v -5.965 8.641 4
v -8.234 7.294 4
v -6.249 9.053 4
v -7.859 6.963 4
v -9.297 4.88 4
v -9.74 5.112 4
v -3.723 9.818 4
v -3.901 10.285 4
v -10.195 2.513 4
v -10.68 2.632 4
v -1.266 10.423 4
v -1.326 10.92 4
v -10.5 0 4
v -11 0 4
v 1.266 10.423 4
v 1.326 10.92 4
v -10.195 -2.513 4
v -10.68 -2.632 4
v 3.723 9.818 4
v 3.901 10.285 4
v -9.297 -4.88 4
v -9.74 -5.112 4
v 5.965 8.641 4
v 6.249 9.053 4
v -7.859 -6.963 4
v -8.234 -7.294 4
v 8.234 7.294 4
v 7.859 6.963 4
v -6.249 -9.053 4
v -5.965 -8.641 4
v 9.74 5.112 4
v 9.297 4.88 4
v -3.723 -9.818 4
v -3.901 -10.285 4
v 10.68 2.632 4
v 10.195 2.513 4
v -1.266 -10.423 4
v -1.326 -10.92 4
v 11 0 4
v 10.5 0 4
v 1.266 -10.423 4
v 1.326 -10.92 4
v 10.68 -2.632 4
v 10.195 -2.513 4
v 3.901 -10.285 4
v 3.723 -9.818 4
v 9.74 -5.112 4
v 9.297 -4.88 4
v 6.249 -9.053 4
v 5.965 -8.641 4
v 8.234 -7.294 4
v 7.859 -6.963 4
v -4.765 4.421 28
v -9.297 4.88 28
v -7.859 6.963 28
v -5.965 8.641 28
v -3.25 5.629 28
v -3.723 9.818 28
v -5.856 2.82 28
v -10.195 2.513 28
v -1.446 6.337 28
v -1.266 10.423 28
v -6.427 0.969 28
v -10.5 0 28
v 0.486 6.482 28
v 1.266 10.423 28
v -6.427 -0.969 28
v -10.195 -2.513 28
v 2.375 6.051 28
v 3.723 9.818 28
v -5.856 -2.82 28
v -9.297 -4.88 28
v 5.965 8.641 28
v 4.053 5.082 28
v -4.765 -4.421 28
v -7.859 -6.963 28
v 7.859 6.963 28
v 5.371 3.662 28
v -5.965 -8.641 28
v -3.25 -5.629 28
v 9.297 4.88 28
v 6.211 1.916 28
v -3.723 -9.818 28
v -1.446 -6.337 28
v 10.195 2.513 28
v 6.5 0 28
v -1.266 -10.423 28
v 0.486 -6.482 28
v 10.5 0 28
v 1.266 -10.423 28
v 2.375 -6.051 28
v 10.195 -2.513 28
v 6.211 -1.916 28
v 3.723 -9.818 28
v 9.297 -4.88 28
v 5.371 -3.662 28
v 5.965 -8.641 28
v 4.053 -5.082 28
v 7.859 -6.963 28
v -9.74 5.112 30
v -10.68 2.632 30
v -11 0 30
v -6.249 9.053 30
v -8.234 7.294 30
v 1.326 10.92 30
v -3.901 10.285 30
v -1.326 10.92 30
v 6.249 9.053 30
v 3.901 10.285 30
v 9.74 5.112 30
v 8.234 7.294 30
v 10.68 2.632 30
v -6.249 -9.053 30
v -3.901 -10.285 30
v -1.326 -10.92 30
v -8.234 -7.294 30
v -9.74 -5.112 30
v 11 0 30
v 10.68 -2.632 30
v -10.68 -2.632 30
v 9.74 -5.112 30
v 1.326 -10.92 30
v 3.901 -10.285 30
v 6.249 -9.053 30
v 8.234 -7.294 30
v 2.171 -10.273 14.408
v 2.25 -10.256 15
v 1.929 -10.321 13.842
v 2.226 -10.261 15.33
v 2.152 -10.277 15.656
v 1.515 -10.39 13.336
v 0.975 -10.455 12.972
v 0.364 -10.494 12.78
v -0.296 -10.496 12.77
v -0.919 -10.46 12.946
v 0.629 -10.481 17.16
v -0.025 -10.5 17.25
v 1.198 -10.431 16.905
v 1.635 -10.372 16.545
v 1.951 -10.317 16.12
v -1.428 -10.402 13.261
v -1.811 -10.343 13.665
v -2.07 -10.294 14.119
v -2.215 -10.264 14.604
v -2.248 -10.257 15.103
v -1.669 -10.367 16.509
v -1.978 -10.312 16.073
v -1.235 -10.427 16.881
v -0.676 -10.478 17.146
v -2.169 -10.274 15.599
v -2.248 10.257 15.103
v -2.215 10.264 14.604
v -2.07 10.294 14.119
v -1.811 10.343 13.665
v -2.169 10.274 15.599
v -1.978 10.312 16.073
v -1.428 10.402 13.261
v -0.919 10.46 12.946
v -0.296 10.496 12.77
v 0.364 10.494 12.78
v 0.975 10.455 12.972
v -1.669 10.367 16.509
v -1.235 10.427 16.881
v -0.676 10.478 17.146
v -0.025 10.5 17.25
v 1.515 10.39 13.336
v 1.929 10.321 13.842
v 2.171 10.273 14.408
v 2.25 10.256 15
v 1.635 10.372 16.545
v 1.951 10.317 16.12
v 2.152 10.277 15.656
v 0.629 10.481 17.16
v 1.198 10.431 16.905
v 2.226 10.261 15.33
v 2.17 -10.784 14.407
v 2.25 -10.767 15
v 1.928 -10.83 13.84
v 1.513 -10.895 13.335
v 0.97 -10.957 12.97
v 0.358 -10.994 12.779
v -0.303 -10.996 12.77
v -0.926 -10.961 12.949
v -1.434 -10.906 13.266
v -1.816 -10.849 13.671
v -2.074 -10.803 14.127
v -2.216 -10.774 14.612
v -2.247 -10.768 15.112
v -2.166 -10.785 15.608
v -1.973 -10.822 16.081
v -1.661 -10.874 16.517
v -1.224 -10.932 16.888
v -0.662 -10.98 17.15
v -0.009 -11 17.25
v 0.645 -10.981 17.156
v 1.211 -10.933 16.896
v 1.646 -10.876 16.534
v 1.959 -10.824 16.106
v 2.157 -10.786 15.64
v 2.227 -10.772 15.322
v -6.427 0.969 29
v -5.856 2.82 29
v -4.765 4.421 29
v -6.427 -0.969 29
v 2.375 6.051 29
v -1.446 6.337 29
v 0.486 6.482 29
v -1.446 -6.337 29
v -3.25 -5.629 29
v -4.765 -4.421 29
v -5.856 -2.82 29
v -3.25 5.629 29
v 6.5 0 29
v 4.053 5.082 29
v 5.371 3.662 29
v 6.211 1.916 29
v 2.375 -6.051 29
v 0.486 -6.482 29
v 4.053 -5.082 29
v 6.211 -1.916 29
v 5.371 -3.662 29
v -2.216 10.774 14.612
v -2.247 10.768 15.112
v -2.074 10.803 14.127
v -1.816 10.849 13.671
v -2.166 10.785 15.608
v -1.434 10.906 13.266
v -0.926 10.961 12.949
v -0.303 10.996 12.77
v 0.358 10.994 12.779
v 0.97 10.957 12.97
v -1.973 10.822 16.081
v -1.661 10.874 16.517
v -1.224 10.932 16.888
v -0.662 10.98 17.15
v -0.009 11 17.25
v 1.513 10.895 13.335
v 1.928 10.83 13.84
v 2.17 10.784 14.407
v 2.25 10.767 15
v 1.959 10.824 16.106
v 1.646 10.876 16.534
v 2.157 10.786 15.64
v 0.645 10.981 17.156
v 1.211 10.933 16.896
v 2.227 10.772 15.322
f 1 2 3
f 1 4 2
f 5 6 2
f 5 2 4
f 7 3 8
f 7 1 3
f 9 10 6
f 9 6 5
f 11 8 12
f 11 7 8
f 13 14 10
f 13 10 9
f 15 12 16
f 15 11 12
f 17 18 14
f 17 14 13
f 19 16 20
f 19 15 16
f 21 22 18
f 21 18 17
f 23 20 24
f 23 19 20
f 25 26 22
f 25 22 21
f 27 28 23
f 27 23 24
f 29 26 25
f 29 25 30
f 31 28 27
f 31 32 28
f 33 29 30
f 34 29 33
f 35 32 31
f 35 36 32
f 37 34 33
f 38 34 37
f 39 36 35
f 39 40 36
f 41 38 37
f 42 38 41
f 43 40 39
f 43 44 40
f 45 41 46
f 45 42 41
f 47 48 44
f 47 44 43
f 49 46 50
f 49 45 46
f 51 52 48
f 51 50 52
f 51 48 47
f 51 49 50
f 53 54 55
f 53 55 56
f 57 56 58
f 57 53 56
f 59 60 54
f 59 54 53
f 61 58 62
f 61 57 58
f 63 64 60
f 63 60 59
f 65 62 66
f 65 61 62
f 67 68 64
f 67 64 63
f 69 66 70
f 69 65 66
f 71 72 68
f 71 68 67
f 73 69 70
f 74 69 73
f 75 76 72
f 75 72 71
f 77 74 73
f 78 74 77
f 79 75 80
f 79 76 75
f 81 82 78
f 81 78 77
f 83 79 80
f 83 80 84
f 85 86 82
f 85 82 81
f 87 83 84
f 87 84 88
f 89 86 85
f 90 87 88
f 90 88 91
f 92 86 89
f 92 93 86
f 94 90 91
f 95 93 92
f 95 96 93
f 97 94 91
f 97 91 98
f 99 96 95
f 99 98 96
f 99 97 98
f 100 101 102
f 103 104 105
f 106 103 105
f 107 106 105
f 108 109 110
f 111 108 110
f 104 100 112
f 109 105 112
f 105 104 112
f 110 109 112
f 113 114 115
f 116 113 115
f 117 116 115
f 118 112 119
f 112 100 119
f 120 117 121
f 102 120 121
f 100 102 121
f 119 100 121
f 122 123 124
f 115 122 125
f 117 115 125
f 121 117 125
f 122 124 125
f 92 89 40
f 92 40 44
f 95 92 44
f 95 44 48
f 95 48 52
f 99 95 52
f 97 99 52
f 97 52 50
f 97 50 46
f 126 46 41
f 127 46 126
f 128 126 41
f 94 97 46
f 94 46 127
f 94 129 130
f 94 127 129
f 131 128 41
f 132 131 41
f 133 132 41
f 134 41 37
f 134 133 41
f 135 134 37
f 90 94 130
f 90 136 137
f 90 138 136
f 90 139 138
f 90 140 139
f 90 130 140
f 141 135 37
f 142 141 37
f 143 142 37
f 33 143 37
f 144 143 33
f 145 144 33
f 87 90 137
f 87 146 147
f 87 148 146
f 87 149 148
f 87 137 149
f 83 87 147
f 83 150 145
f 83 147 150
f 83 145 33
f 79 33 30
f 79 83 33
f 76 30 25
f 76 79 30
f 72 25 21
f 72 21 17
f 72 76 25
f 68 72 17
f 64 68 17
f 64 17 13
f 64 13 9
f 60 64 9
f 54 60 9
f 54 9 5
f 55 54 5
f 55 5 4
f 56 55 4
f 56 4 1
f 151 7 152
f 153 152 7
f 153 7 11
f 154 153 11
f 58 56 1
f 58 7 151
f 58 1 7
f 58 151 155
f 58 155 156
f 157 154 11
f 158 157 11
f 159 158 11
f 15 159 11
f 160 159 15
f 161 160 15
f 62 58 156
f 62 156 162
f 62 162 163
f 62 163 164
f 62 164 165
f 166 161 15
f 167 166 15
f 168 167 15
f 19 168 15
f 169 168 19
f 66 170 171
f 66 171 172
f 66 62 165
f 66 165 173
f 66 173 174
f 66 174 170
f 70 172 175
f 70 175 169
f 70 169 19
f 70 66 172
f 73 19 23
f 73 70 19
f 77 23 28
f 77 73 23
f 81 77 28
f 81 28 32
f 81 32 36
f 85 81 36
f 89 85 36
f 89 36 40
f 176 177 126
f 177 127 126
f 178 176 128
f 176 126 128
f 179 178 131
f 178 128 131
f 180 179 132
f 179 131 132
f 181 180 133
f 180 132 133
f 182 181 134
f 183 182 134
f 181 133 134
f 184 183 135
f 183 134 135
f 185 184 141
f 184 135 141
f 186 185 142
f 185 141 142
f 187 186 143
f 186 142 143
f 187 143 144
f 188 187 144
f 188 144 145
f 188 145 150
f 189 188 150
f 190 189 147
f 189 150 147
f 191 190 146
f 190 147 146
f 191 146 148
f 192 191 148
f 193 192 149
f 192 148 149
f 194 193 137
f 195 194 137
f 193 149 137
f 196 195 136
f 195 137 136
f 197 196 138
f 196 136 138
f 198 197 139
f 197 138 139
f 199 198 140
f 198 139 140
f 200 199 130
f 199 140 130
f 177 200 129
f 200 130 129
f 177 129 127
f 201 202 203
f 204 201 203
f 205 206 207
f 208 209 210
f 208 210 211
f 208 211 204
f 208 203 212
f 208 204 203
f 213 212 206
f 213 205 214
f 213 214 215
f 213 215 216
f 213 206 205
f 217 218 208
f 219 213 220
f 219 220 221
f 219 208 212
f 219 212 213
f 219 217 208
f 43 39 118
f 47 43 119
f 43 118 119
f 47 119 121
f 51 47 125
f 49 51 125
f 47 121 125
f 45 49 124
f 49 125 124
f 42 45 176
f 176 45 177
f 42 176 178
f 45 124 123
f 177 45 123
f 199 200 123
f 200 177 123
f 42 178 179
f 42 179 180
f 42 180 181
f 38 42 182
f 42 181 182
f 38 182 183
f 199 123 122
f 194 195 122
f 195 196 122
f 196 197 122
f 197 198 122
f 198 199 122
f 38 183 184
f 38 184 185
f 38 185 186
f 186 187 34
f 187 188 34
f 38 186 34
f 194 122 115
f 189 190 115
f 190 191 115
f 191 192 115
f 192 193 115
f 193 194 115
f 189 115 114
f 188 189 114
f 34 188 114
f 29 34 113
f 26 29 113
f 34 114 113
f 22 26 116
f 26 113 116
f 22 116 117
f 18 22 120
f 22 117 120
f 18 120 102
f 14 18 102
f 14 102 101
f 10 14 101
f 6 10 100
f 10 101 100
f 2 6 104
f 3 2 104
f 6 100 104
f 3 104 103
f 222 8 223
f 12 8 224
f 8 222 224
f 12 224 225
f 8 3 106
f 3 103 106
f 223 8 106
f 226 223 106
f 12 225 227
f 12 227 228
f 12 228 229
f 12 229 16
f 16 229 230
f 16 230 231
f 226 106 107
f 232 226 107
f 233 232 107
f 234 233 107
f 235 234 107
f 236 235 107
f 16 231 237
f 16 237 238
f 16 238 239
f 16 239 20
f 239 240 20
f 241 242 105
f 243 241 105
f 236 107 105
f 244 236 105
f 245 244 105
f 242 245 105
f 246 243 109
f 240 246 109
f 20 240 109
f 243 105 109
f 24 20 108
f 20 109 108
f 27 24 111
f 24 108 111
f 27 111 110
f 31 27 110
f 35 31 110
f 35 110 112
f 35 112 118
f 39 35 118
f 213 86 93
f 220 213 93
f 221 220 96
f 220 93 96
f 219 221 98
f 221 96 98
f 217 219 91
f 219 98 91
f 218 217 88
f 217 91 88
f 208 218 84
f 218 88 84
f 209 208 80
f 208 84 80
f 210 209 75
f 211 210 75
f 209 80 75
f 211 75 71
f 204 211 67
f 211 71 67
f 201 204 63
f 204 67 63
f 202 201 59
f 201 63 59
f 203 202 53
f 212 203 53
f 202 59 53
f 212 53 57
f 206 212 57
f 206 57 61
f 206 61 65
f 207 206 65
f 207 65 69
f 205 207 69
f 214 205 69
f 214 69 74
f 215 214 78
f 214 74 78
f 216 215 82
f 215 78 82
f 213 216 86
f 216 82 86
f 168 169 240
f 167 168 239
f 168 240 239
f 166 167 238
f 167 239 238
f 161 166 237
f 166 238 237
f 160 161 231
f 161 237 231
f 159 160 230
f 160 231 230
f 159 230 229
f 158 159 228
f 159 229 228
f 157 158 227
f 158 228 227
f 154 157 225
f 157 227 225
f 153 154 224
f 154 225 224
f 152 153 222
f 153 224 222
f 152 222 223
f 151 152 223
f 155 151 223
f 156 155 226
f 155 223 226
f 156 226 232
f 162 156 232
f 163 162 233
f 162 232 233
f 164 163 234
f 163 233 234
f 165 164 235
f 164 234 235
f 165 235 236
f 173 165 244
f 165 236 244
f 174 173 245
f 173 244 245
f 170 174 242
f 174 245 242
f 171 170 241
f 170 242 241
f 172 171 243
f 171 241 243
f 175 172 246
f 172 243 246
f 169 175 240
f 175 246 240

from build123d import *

# Parameters (mm, degrees)
SKETCH014_R             = 11
PAD013_DEPTH            = 2
SKETCH015_R             = 6.5
POCKET005_DEPTH         = 1
SKETCH016_R             = 11
SKETCH016_R_2           = 10.5
PAD014_DEPTH            = 24
SKETCH017_R             = 2.25
POCKET006_DEPTH         = 12
BODY009_PLACEMENT_ANGLE = 180


with BuildPart() as part:
    # Sketch014 → Pad013 (new body)
    with BuildSketch(Plane.XY):
        Circle(SKETCH014_R)
    extrude(amount=PAD013_DEPTH)

    # Sketch015 (on Face3 of Pad013) → Pocket005 (cut)
    with BuildSketch(Plane.XY.offset(2)):
        Circle(SKETCH015_R)
    extrude(amount=-POCKET005_DEPTH, mode=Mode.SUBTRACT)

    # Sketch016 (on Face3 of Pocket005) → Pad014 (join)
    with BuildSketch(Plane.XY.offset(2)):
        Circle(SKETCH016_R)
        Circle(SKETCH016_R_2, mode=Mode.SUBTRACT)
    extrude(amount=PAD014_DEPTH)

    # Sketch017 → Pocket006 (cut, symmetric)
    with BuildSketch(Plane.XZ):
        with Locations((0, 15)):
            Circle(SKETCH017_R)
    extrude(amount=POCKET006_DEPTH, both=True, mode=Mode.SUBTRACT)


with BuildPart() as part_1:
    # Body009 placement: moved
    add(part.part.moved(Location((0, 0, 30))).rotate(Axis((0, 0, 30), (1, 0, 0)), BODY009_PLACEMENT_ANGLE))


solid = part_1.part
